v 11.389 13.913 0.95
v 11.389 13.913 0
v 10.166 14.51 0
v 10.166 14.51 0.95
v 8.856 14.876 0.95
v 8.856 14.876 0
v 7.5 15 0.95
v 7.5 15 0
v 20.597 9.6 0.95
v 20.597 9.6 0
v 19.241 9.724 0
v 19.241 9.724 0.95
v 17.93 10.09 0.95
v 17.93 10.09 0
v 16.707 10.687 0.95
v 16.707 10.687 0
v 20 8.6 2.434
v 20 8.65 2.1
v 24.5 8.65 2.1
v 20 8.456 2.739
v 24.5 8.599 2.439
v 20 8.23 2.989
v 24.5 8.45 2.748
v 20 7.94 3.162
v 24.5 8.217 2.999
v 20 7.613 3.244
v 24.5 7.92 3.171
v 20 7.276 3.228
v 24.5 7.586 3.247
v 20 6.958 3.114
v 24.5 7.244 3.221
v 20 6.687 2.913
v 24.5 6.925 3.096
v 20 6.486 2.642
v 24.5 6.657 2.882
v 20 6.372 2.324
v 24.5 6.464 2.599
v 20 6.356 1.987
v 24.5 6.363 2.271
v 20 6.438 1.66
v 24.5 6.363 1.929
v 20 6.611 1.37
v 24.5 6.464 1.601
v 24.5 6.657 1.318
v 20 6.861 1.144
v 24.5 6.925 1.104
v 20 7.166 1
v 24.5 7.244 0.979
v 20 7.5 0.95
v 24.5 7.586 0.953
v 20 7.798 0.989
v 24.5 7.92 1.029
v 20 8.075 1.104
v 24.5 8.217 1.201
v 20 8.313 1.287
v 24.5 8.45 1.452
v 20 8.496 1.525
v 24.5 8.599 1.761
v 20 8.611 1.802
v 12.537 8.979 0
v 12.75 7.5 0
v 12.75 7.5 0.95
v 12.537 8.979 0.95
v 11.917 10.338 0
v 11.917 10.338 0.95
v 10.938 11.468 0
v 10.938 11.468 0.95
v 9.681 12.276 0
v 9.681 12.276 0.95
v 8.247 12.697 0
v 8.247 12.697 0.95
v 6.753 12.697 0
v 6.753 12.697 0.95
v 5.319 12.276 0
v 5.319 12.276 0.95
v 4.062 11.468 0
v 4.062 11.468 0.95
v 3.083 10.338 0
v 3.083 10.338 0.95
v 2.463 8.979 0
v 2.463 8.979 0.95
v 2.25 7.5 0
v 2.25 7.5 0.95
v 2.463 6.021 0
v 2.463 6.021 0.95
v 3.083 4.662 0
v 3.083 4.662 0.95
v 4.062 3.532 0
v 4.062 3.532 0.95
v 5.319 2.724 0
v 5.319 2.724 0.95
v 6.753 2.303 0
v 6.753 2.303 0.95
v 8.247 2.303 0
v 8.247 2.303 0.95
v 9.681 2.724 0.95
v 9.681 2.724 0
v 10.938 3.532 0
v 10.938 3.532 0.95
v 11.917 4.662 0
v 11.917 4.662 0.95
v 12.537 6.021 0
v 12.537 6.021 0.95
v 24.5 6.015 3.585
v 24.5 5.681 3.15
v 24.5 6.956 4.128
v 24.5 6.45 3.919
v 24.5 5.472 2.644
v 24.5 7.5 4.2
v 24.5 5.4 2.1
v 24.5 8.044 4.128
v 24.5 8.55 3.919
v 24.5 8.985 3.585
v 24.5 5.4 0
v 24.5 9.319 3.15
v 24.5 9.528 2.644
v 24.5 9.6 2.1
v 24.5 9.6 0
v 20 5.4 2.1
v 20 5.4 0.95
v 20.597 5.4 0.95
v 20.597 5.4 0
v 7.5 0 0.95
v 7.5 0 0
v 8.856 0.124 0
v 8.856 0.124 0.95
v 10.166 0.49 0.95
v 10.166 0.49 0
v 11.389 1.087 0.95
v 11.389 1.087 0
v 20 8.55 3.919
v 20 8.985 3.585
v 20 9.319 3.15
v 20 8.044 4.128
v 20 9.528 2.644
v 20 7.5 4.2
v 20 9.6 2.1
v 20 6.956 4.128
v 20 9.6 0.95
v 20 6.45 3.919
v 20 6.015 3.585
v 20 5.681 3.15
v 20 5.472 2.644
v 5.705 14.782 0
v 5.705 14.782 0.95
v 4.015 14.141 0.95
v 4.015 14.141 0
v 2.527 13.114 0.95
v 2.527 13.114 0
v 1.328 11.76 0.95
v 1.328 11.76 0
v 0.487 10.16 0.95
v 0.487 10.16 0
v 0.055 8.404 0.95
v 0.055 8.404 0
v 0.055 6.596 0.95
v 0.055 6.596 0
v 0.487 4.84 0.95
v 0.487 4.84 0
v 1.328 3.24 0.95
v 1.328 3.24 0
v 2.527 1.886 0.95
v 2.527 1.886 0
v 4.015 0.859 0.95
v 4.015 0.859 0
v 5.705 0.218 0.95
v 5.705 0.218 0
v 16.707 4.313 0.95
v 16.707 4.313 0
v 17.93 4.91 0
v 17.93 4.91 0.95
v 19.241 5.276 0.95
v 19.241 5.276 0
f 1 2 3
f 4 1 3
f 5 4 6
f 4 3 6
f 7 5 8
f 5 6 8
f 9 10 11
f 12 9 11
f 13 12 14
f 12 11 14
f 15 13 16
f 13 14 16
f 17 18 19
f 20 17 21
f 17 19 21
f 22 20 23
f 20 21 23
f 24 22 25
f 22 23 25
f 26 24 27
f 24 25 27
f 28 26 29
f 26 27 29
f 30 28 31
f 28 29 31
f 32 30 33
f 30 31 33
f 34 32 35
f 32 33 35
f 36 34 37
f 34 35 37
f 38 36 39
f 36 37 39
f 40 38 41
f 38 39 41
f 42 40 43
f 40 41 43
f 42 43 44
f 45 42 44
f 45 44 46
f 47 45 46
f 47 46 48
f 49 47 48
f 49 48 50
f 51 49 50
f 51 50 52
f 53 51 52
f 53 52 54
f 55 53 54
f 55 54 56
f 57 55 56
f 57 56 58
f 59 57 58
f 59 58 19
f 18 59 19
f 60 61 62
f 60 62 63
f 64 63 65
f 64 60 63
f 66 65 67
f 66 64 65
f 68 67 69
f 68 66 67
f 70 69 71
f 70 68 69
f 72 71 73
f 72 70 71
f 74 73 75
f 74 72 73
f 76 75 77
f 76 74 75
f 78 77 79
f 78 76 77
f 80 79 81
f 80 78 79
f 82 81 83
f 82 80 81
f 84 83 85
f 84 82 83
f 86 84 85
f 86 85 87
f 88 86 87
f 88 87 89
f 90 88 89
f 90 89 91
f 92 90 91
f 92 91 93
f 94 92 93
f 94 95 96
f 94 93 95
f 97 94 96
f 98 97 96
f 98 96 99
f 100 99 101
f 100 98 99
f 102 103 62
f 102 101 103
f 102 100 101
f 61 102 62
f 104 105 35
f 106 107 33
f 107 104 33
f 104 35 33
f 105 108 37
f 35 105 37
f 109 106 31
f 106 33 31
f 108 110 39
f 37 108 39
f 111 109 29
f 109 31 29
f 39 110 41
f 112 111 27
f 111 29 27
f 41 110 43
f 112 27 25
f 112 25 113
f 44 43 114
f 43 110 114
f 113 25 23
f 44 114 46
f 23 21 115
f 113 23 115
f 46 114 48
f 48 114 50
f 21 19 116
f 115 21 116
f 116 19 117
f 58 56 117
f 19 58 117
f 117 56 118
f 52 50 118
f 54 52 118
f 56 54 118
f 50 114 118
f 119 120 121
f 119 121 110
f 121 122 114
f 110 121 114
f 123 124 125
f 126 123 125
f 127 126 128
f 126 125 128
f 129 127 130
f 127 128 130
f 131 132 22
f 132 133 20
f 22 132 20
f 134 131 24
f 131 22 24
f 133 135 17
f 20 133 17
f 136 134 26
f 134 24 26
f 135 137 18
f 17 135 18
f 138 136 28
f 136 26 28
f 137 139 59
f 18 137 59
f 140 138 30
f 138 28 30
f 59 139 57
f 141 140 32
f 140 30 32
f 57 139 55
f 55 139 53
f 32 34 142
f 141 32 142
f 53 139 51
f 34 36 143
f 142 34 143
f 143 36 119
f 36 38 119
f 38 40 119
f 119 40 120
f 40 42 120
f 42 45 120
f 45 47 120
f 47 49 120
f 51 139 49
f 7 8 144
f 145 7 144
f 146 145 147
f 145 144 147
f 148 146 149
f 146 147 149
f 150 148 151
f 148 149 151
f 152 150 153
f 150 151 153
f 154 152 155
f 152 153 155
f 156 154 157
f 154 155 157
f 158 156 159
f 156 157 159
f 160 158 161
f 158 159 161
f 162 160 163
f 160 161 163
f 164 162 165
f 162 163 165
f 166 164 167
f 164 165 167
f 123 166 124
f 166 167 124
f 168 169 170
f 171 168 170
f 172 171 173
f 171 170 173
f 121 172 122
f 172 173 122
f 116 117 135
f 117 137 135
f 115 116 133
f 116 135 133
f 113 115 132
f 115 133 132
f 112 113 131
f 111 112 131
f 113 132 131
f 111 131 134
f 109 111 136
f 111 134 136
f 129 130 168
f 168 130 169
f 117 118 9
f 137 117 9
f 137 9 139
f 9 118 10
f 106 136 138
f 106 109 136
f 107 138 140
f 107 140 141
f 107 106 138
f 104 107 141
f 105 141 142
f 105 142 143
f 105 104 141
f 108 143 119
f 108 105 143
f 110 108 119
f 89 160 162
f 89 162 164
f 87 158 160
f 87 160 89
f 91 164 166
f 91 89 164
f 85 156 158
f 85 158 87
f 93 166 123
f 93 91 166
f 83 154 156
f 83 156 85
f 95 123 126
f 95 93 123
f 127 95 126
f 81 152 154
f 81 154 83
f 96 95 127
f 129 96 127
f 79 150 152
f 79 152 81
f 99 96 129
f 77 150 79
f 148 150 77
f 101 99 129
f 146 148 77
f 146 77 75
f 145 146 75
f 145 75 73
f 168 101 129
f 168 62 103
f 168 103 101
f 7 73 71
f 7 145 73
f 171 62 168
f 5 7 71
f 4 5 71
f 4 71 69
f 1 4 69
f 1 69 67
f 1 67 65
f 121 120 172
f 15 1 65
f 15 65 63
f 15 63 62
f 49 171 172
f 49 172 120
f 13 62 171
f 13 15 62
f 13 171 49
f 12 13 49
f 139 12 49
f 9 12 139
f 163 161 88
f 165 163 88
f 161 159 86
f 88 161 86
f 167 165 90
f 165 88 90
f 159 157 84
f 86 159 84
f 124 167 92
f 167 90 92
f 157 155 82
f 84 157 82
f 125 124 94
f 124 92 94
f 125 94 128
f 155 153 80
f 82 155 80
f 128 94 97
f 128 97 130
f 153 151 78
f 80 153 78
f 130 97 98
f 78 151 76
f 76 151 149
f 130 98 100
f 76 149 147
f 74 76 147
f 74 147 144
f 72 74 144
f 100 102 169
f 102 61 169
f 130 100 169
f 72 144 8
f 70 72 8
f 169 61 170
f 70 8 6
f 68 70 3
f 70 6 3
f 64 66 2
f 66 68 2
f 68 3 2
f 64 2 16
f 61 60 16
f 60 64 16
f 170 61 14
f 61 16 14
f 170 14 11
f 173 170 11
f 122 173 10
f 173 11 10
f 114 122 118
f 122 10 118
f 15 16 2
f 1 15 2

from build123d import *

# Parameters (mm, degrees)
F0_R     = 5.25
F1_DEPTH = 0.95
F3_DEPTH = 3.25
F4_R     = 2.09999
F5_R     = 1.15
F6_DEPTH = 25


# Not quite as in the source:
# - a fillet or chamfer is up to 0.001 mm smaller than in the source, because OpenCascade refuses the exact size


with BuildPart() as f1:
    # F0 (on Top) → F1 (new body)
    with BuildSketch(Plane.XY):
        with BuildLine():
            Line((20.596680348, 5.4), (24.5, 5.4))
            Line((24.5, 5.4), (24.5, 9.6))
            Line((24.5, 9.6), (20.596680348, 9.6))
            ThreePointArc((20.596680348, 9.6), (18.5774207214, 9.8769403602), (16.7072849584, 10.6873091839))
            Line((16.7072849584, 10.6873091839), (11.3893953897, 13.9126908161))
            ThreePointArc((11.3893953897, 13.9126908161), (9.5192596266, 14.7230596398), (7.5, 15))
            ThreePointArc((7.5, 15), (2.1966991411, 12.8033008589), (0, 7.5))
            ThreePointArc((0, 7.5), (2.1966991411, 2.1966991411), (7.5, 0))
            ThreePointArc((7.5, 0), (9.5192596266, 0.2769403602), (11.3893953897, 1.0873091839))
            Line((11.3893953897, 1.0873091839), (16.7072849584, 4.3126908161))
            ThreePointArc((16.7072849584, 4.3126908161), (18.5774207214, 5.1230596398), (20.596680348, 5.4))
        make_face()
        with Locations((7.5, 7.5)):
            Circle(F0_R, mode=Mode.SUBTRACT)
    extrude(amount=F1_DEPTH)

    # F2 (on face) → F3 (join)
    with BuildSketch(Plane.XY.offset(0.95)):
        Polygon((24.5, 5.4), (24.5, 9.6), (20.596680348, 9.6), (20, 9.6), (20, 5.4), (20.596680348, 5.4), align=None)
    extrude(amount=F3_DEPTH)

    # F4 (radius 2.1 in the source; OpenCascade refuses exactly that, so slightly less here)
    f4_edges = [f1.edges().sort_by_distance(p)[0] for p in [
        (22.25, 9.6, 4.2),
        (22.25, 5.4, 4.2),
    ]]
    fillet(f4_edges, radius=F4_R)

    # F5 (on face) → F6 (cut)
    with BuildSketch(Plane.YZ.offset(24.5)):
        with Locations((7.5, 2.1)):
            Circle(F5_R)
    extrude(amount=-F6_DEPTH, mode=Mode.SUBTRACT)


solid = f1.part
